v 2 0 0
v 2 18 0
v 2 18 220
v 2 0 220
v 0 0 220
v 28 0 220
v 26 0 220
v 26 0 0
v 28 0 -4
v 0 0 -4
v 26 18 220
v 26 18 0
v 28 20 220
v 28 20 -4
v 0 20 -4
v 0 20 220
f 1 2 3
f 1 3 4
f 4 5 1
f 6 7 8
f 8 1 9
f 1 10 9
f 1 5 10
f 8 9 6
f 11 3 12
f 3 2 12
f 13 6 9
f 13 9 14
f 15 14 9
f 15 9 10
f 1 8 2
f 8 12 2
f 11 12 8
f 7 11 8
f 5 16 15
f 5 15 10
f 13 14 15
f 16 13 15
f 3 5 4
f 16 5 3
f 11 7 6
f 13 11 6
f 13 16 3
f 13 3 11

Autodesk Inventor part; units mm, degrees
ref_plane "YZ Plane" through (0, 0, 0) normal (1, 0, 0) x (0, 1, 0)
ref_plane "XZ Plane" through (0, 0, 0) normal (0, 1, 0) x (-1, 0, 0)
ref_plane "XY Plane" through (0, 0, 0) normal (0, 0, 1) x (1, 0, 0)
sketch "Sketch1" plane through (0, 0, 0) normal (0, 0, 1) x (1, 0, 0)
  line L0 (0, 0) -> (28, 0)
  line L1 (28, 0) -> (28, 20)
  line L2 (28, 20) -> (0, 20)
  line L3 (0, 20) -> (0, 0)
  line L4 (2, 18) -> (26, 18)
  line L5 (26, 18) -> (26, 2)
  line L6 (26, 2) -> (2, 2)
  line L7 (2, 2) -> (2, 18)
  line L8 (2, 2) -> (2, 0)
  line L9 (26, 2) -> (26, 0)
  dimension "d0" = 28
  dimension "d1" = 20
  dimension "d2" = 2
extrude "Extrusion1" add sketch "Sketch1" along normal blind 220 contours L3 L2 L1 L0 L9 L5 L4 L7 L8
sketch "Sketch2" plane through (0, 0, 0) normal (0, 0, -1) x (-1, 0, 0)
  line L0 (-28, 20) -> (0, 20) projected
  line L1 (0, 0) -> (-2, 0) projected
  line L2 (-28, 20) -> (0, 20)
  line L3 (0, 20) -> (0, 0)
  line L4 (0, 0) -> (-28, 0)
  line L5 (-28, 0) -> (-28, 20)
extrude "Extrusion2" add sketch "Sketch2" along normal blind 4
properties part number "fan_duct"
